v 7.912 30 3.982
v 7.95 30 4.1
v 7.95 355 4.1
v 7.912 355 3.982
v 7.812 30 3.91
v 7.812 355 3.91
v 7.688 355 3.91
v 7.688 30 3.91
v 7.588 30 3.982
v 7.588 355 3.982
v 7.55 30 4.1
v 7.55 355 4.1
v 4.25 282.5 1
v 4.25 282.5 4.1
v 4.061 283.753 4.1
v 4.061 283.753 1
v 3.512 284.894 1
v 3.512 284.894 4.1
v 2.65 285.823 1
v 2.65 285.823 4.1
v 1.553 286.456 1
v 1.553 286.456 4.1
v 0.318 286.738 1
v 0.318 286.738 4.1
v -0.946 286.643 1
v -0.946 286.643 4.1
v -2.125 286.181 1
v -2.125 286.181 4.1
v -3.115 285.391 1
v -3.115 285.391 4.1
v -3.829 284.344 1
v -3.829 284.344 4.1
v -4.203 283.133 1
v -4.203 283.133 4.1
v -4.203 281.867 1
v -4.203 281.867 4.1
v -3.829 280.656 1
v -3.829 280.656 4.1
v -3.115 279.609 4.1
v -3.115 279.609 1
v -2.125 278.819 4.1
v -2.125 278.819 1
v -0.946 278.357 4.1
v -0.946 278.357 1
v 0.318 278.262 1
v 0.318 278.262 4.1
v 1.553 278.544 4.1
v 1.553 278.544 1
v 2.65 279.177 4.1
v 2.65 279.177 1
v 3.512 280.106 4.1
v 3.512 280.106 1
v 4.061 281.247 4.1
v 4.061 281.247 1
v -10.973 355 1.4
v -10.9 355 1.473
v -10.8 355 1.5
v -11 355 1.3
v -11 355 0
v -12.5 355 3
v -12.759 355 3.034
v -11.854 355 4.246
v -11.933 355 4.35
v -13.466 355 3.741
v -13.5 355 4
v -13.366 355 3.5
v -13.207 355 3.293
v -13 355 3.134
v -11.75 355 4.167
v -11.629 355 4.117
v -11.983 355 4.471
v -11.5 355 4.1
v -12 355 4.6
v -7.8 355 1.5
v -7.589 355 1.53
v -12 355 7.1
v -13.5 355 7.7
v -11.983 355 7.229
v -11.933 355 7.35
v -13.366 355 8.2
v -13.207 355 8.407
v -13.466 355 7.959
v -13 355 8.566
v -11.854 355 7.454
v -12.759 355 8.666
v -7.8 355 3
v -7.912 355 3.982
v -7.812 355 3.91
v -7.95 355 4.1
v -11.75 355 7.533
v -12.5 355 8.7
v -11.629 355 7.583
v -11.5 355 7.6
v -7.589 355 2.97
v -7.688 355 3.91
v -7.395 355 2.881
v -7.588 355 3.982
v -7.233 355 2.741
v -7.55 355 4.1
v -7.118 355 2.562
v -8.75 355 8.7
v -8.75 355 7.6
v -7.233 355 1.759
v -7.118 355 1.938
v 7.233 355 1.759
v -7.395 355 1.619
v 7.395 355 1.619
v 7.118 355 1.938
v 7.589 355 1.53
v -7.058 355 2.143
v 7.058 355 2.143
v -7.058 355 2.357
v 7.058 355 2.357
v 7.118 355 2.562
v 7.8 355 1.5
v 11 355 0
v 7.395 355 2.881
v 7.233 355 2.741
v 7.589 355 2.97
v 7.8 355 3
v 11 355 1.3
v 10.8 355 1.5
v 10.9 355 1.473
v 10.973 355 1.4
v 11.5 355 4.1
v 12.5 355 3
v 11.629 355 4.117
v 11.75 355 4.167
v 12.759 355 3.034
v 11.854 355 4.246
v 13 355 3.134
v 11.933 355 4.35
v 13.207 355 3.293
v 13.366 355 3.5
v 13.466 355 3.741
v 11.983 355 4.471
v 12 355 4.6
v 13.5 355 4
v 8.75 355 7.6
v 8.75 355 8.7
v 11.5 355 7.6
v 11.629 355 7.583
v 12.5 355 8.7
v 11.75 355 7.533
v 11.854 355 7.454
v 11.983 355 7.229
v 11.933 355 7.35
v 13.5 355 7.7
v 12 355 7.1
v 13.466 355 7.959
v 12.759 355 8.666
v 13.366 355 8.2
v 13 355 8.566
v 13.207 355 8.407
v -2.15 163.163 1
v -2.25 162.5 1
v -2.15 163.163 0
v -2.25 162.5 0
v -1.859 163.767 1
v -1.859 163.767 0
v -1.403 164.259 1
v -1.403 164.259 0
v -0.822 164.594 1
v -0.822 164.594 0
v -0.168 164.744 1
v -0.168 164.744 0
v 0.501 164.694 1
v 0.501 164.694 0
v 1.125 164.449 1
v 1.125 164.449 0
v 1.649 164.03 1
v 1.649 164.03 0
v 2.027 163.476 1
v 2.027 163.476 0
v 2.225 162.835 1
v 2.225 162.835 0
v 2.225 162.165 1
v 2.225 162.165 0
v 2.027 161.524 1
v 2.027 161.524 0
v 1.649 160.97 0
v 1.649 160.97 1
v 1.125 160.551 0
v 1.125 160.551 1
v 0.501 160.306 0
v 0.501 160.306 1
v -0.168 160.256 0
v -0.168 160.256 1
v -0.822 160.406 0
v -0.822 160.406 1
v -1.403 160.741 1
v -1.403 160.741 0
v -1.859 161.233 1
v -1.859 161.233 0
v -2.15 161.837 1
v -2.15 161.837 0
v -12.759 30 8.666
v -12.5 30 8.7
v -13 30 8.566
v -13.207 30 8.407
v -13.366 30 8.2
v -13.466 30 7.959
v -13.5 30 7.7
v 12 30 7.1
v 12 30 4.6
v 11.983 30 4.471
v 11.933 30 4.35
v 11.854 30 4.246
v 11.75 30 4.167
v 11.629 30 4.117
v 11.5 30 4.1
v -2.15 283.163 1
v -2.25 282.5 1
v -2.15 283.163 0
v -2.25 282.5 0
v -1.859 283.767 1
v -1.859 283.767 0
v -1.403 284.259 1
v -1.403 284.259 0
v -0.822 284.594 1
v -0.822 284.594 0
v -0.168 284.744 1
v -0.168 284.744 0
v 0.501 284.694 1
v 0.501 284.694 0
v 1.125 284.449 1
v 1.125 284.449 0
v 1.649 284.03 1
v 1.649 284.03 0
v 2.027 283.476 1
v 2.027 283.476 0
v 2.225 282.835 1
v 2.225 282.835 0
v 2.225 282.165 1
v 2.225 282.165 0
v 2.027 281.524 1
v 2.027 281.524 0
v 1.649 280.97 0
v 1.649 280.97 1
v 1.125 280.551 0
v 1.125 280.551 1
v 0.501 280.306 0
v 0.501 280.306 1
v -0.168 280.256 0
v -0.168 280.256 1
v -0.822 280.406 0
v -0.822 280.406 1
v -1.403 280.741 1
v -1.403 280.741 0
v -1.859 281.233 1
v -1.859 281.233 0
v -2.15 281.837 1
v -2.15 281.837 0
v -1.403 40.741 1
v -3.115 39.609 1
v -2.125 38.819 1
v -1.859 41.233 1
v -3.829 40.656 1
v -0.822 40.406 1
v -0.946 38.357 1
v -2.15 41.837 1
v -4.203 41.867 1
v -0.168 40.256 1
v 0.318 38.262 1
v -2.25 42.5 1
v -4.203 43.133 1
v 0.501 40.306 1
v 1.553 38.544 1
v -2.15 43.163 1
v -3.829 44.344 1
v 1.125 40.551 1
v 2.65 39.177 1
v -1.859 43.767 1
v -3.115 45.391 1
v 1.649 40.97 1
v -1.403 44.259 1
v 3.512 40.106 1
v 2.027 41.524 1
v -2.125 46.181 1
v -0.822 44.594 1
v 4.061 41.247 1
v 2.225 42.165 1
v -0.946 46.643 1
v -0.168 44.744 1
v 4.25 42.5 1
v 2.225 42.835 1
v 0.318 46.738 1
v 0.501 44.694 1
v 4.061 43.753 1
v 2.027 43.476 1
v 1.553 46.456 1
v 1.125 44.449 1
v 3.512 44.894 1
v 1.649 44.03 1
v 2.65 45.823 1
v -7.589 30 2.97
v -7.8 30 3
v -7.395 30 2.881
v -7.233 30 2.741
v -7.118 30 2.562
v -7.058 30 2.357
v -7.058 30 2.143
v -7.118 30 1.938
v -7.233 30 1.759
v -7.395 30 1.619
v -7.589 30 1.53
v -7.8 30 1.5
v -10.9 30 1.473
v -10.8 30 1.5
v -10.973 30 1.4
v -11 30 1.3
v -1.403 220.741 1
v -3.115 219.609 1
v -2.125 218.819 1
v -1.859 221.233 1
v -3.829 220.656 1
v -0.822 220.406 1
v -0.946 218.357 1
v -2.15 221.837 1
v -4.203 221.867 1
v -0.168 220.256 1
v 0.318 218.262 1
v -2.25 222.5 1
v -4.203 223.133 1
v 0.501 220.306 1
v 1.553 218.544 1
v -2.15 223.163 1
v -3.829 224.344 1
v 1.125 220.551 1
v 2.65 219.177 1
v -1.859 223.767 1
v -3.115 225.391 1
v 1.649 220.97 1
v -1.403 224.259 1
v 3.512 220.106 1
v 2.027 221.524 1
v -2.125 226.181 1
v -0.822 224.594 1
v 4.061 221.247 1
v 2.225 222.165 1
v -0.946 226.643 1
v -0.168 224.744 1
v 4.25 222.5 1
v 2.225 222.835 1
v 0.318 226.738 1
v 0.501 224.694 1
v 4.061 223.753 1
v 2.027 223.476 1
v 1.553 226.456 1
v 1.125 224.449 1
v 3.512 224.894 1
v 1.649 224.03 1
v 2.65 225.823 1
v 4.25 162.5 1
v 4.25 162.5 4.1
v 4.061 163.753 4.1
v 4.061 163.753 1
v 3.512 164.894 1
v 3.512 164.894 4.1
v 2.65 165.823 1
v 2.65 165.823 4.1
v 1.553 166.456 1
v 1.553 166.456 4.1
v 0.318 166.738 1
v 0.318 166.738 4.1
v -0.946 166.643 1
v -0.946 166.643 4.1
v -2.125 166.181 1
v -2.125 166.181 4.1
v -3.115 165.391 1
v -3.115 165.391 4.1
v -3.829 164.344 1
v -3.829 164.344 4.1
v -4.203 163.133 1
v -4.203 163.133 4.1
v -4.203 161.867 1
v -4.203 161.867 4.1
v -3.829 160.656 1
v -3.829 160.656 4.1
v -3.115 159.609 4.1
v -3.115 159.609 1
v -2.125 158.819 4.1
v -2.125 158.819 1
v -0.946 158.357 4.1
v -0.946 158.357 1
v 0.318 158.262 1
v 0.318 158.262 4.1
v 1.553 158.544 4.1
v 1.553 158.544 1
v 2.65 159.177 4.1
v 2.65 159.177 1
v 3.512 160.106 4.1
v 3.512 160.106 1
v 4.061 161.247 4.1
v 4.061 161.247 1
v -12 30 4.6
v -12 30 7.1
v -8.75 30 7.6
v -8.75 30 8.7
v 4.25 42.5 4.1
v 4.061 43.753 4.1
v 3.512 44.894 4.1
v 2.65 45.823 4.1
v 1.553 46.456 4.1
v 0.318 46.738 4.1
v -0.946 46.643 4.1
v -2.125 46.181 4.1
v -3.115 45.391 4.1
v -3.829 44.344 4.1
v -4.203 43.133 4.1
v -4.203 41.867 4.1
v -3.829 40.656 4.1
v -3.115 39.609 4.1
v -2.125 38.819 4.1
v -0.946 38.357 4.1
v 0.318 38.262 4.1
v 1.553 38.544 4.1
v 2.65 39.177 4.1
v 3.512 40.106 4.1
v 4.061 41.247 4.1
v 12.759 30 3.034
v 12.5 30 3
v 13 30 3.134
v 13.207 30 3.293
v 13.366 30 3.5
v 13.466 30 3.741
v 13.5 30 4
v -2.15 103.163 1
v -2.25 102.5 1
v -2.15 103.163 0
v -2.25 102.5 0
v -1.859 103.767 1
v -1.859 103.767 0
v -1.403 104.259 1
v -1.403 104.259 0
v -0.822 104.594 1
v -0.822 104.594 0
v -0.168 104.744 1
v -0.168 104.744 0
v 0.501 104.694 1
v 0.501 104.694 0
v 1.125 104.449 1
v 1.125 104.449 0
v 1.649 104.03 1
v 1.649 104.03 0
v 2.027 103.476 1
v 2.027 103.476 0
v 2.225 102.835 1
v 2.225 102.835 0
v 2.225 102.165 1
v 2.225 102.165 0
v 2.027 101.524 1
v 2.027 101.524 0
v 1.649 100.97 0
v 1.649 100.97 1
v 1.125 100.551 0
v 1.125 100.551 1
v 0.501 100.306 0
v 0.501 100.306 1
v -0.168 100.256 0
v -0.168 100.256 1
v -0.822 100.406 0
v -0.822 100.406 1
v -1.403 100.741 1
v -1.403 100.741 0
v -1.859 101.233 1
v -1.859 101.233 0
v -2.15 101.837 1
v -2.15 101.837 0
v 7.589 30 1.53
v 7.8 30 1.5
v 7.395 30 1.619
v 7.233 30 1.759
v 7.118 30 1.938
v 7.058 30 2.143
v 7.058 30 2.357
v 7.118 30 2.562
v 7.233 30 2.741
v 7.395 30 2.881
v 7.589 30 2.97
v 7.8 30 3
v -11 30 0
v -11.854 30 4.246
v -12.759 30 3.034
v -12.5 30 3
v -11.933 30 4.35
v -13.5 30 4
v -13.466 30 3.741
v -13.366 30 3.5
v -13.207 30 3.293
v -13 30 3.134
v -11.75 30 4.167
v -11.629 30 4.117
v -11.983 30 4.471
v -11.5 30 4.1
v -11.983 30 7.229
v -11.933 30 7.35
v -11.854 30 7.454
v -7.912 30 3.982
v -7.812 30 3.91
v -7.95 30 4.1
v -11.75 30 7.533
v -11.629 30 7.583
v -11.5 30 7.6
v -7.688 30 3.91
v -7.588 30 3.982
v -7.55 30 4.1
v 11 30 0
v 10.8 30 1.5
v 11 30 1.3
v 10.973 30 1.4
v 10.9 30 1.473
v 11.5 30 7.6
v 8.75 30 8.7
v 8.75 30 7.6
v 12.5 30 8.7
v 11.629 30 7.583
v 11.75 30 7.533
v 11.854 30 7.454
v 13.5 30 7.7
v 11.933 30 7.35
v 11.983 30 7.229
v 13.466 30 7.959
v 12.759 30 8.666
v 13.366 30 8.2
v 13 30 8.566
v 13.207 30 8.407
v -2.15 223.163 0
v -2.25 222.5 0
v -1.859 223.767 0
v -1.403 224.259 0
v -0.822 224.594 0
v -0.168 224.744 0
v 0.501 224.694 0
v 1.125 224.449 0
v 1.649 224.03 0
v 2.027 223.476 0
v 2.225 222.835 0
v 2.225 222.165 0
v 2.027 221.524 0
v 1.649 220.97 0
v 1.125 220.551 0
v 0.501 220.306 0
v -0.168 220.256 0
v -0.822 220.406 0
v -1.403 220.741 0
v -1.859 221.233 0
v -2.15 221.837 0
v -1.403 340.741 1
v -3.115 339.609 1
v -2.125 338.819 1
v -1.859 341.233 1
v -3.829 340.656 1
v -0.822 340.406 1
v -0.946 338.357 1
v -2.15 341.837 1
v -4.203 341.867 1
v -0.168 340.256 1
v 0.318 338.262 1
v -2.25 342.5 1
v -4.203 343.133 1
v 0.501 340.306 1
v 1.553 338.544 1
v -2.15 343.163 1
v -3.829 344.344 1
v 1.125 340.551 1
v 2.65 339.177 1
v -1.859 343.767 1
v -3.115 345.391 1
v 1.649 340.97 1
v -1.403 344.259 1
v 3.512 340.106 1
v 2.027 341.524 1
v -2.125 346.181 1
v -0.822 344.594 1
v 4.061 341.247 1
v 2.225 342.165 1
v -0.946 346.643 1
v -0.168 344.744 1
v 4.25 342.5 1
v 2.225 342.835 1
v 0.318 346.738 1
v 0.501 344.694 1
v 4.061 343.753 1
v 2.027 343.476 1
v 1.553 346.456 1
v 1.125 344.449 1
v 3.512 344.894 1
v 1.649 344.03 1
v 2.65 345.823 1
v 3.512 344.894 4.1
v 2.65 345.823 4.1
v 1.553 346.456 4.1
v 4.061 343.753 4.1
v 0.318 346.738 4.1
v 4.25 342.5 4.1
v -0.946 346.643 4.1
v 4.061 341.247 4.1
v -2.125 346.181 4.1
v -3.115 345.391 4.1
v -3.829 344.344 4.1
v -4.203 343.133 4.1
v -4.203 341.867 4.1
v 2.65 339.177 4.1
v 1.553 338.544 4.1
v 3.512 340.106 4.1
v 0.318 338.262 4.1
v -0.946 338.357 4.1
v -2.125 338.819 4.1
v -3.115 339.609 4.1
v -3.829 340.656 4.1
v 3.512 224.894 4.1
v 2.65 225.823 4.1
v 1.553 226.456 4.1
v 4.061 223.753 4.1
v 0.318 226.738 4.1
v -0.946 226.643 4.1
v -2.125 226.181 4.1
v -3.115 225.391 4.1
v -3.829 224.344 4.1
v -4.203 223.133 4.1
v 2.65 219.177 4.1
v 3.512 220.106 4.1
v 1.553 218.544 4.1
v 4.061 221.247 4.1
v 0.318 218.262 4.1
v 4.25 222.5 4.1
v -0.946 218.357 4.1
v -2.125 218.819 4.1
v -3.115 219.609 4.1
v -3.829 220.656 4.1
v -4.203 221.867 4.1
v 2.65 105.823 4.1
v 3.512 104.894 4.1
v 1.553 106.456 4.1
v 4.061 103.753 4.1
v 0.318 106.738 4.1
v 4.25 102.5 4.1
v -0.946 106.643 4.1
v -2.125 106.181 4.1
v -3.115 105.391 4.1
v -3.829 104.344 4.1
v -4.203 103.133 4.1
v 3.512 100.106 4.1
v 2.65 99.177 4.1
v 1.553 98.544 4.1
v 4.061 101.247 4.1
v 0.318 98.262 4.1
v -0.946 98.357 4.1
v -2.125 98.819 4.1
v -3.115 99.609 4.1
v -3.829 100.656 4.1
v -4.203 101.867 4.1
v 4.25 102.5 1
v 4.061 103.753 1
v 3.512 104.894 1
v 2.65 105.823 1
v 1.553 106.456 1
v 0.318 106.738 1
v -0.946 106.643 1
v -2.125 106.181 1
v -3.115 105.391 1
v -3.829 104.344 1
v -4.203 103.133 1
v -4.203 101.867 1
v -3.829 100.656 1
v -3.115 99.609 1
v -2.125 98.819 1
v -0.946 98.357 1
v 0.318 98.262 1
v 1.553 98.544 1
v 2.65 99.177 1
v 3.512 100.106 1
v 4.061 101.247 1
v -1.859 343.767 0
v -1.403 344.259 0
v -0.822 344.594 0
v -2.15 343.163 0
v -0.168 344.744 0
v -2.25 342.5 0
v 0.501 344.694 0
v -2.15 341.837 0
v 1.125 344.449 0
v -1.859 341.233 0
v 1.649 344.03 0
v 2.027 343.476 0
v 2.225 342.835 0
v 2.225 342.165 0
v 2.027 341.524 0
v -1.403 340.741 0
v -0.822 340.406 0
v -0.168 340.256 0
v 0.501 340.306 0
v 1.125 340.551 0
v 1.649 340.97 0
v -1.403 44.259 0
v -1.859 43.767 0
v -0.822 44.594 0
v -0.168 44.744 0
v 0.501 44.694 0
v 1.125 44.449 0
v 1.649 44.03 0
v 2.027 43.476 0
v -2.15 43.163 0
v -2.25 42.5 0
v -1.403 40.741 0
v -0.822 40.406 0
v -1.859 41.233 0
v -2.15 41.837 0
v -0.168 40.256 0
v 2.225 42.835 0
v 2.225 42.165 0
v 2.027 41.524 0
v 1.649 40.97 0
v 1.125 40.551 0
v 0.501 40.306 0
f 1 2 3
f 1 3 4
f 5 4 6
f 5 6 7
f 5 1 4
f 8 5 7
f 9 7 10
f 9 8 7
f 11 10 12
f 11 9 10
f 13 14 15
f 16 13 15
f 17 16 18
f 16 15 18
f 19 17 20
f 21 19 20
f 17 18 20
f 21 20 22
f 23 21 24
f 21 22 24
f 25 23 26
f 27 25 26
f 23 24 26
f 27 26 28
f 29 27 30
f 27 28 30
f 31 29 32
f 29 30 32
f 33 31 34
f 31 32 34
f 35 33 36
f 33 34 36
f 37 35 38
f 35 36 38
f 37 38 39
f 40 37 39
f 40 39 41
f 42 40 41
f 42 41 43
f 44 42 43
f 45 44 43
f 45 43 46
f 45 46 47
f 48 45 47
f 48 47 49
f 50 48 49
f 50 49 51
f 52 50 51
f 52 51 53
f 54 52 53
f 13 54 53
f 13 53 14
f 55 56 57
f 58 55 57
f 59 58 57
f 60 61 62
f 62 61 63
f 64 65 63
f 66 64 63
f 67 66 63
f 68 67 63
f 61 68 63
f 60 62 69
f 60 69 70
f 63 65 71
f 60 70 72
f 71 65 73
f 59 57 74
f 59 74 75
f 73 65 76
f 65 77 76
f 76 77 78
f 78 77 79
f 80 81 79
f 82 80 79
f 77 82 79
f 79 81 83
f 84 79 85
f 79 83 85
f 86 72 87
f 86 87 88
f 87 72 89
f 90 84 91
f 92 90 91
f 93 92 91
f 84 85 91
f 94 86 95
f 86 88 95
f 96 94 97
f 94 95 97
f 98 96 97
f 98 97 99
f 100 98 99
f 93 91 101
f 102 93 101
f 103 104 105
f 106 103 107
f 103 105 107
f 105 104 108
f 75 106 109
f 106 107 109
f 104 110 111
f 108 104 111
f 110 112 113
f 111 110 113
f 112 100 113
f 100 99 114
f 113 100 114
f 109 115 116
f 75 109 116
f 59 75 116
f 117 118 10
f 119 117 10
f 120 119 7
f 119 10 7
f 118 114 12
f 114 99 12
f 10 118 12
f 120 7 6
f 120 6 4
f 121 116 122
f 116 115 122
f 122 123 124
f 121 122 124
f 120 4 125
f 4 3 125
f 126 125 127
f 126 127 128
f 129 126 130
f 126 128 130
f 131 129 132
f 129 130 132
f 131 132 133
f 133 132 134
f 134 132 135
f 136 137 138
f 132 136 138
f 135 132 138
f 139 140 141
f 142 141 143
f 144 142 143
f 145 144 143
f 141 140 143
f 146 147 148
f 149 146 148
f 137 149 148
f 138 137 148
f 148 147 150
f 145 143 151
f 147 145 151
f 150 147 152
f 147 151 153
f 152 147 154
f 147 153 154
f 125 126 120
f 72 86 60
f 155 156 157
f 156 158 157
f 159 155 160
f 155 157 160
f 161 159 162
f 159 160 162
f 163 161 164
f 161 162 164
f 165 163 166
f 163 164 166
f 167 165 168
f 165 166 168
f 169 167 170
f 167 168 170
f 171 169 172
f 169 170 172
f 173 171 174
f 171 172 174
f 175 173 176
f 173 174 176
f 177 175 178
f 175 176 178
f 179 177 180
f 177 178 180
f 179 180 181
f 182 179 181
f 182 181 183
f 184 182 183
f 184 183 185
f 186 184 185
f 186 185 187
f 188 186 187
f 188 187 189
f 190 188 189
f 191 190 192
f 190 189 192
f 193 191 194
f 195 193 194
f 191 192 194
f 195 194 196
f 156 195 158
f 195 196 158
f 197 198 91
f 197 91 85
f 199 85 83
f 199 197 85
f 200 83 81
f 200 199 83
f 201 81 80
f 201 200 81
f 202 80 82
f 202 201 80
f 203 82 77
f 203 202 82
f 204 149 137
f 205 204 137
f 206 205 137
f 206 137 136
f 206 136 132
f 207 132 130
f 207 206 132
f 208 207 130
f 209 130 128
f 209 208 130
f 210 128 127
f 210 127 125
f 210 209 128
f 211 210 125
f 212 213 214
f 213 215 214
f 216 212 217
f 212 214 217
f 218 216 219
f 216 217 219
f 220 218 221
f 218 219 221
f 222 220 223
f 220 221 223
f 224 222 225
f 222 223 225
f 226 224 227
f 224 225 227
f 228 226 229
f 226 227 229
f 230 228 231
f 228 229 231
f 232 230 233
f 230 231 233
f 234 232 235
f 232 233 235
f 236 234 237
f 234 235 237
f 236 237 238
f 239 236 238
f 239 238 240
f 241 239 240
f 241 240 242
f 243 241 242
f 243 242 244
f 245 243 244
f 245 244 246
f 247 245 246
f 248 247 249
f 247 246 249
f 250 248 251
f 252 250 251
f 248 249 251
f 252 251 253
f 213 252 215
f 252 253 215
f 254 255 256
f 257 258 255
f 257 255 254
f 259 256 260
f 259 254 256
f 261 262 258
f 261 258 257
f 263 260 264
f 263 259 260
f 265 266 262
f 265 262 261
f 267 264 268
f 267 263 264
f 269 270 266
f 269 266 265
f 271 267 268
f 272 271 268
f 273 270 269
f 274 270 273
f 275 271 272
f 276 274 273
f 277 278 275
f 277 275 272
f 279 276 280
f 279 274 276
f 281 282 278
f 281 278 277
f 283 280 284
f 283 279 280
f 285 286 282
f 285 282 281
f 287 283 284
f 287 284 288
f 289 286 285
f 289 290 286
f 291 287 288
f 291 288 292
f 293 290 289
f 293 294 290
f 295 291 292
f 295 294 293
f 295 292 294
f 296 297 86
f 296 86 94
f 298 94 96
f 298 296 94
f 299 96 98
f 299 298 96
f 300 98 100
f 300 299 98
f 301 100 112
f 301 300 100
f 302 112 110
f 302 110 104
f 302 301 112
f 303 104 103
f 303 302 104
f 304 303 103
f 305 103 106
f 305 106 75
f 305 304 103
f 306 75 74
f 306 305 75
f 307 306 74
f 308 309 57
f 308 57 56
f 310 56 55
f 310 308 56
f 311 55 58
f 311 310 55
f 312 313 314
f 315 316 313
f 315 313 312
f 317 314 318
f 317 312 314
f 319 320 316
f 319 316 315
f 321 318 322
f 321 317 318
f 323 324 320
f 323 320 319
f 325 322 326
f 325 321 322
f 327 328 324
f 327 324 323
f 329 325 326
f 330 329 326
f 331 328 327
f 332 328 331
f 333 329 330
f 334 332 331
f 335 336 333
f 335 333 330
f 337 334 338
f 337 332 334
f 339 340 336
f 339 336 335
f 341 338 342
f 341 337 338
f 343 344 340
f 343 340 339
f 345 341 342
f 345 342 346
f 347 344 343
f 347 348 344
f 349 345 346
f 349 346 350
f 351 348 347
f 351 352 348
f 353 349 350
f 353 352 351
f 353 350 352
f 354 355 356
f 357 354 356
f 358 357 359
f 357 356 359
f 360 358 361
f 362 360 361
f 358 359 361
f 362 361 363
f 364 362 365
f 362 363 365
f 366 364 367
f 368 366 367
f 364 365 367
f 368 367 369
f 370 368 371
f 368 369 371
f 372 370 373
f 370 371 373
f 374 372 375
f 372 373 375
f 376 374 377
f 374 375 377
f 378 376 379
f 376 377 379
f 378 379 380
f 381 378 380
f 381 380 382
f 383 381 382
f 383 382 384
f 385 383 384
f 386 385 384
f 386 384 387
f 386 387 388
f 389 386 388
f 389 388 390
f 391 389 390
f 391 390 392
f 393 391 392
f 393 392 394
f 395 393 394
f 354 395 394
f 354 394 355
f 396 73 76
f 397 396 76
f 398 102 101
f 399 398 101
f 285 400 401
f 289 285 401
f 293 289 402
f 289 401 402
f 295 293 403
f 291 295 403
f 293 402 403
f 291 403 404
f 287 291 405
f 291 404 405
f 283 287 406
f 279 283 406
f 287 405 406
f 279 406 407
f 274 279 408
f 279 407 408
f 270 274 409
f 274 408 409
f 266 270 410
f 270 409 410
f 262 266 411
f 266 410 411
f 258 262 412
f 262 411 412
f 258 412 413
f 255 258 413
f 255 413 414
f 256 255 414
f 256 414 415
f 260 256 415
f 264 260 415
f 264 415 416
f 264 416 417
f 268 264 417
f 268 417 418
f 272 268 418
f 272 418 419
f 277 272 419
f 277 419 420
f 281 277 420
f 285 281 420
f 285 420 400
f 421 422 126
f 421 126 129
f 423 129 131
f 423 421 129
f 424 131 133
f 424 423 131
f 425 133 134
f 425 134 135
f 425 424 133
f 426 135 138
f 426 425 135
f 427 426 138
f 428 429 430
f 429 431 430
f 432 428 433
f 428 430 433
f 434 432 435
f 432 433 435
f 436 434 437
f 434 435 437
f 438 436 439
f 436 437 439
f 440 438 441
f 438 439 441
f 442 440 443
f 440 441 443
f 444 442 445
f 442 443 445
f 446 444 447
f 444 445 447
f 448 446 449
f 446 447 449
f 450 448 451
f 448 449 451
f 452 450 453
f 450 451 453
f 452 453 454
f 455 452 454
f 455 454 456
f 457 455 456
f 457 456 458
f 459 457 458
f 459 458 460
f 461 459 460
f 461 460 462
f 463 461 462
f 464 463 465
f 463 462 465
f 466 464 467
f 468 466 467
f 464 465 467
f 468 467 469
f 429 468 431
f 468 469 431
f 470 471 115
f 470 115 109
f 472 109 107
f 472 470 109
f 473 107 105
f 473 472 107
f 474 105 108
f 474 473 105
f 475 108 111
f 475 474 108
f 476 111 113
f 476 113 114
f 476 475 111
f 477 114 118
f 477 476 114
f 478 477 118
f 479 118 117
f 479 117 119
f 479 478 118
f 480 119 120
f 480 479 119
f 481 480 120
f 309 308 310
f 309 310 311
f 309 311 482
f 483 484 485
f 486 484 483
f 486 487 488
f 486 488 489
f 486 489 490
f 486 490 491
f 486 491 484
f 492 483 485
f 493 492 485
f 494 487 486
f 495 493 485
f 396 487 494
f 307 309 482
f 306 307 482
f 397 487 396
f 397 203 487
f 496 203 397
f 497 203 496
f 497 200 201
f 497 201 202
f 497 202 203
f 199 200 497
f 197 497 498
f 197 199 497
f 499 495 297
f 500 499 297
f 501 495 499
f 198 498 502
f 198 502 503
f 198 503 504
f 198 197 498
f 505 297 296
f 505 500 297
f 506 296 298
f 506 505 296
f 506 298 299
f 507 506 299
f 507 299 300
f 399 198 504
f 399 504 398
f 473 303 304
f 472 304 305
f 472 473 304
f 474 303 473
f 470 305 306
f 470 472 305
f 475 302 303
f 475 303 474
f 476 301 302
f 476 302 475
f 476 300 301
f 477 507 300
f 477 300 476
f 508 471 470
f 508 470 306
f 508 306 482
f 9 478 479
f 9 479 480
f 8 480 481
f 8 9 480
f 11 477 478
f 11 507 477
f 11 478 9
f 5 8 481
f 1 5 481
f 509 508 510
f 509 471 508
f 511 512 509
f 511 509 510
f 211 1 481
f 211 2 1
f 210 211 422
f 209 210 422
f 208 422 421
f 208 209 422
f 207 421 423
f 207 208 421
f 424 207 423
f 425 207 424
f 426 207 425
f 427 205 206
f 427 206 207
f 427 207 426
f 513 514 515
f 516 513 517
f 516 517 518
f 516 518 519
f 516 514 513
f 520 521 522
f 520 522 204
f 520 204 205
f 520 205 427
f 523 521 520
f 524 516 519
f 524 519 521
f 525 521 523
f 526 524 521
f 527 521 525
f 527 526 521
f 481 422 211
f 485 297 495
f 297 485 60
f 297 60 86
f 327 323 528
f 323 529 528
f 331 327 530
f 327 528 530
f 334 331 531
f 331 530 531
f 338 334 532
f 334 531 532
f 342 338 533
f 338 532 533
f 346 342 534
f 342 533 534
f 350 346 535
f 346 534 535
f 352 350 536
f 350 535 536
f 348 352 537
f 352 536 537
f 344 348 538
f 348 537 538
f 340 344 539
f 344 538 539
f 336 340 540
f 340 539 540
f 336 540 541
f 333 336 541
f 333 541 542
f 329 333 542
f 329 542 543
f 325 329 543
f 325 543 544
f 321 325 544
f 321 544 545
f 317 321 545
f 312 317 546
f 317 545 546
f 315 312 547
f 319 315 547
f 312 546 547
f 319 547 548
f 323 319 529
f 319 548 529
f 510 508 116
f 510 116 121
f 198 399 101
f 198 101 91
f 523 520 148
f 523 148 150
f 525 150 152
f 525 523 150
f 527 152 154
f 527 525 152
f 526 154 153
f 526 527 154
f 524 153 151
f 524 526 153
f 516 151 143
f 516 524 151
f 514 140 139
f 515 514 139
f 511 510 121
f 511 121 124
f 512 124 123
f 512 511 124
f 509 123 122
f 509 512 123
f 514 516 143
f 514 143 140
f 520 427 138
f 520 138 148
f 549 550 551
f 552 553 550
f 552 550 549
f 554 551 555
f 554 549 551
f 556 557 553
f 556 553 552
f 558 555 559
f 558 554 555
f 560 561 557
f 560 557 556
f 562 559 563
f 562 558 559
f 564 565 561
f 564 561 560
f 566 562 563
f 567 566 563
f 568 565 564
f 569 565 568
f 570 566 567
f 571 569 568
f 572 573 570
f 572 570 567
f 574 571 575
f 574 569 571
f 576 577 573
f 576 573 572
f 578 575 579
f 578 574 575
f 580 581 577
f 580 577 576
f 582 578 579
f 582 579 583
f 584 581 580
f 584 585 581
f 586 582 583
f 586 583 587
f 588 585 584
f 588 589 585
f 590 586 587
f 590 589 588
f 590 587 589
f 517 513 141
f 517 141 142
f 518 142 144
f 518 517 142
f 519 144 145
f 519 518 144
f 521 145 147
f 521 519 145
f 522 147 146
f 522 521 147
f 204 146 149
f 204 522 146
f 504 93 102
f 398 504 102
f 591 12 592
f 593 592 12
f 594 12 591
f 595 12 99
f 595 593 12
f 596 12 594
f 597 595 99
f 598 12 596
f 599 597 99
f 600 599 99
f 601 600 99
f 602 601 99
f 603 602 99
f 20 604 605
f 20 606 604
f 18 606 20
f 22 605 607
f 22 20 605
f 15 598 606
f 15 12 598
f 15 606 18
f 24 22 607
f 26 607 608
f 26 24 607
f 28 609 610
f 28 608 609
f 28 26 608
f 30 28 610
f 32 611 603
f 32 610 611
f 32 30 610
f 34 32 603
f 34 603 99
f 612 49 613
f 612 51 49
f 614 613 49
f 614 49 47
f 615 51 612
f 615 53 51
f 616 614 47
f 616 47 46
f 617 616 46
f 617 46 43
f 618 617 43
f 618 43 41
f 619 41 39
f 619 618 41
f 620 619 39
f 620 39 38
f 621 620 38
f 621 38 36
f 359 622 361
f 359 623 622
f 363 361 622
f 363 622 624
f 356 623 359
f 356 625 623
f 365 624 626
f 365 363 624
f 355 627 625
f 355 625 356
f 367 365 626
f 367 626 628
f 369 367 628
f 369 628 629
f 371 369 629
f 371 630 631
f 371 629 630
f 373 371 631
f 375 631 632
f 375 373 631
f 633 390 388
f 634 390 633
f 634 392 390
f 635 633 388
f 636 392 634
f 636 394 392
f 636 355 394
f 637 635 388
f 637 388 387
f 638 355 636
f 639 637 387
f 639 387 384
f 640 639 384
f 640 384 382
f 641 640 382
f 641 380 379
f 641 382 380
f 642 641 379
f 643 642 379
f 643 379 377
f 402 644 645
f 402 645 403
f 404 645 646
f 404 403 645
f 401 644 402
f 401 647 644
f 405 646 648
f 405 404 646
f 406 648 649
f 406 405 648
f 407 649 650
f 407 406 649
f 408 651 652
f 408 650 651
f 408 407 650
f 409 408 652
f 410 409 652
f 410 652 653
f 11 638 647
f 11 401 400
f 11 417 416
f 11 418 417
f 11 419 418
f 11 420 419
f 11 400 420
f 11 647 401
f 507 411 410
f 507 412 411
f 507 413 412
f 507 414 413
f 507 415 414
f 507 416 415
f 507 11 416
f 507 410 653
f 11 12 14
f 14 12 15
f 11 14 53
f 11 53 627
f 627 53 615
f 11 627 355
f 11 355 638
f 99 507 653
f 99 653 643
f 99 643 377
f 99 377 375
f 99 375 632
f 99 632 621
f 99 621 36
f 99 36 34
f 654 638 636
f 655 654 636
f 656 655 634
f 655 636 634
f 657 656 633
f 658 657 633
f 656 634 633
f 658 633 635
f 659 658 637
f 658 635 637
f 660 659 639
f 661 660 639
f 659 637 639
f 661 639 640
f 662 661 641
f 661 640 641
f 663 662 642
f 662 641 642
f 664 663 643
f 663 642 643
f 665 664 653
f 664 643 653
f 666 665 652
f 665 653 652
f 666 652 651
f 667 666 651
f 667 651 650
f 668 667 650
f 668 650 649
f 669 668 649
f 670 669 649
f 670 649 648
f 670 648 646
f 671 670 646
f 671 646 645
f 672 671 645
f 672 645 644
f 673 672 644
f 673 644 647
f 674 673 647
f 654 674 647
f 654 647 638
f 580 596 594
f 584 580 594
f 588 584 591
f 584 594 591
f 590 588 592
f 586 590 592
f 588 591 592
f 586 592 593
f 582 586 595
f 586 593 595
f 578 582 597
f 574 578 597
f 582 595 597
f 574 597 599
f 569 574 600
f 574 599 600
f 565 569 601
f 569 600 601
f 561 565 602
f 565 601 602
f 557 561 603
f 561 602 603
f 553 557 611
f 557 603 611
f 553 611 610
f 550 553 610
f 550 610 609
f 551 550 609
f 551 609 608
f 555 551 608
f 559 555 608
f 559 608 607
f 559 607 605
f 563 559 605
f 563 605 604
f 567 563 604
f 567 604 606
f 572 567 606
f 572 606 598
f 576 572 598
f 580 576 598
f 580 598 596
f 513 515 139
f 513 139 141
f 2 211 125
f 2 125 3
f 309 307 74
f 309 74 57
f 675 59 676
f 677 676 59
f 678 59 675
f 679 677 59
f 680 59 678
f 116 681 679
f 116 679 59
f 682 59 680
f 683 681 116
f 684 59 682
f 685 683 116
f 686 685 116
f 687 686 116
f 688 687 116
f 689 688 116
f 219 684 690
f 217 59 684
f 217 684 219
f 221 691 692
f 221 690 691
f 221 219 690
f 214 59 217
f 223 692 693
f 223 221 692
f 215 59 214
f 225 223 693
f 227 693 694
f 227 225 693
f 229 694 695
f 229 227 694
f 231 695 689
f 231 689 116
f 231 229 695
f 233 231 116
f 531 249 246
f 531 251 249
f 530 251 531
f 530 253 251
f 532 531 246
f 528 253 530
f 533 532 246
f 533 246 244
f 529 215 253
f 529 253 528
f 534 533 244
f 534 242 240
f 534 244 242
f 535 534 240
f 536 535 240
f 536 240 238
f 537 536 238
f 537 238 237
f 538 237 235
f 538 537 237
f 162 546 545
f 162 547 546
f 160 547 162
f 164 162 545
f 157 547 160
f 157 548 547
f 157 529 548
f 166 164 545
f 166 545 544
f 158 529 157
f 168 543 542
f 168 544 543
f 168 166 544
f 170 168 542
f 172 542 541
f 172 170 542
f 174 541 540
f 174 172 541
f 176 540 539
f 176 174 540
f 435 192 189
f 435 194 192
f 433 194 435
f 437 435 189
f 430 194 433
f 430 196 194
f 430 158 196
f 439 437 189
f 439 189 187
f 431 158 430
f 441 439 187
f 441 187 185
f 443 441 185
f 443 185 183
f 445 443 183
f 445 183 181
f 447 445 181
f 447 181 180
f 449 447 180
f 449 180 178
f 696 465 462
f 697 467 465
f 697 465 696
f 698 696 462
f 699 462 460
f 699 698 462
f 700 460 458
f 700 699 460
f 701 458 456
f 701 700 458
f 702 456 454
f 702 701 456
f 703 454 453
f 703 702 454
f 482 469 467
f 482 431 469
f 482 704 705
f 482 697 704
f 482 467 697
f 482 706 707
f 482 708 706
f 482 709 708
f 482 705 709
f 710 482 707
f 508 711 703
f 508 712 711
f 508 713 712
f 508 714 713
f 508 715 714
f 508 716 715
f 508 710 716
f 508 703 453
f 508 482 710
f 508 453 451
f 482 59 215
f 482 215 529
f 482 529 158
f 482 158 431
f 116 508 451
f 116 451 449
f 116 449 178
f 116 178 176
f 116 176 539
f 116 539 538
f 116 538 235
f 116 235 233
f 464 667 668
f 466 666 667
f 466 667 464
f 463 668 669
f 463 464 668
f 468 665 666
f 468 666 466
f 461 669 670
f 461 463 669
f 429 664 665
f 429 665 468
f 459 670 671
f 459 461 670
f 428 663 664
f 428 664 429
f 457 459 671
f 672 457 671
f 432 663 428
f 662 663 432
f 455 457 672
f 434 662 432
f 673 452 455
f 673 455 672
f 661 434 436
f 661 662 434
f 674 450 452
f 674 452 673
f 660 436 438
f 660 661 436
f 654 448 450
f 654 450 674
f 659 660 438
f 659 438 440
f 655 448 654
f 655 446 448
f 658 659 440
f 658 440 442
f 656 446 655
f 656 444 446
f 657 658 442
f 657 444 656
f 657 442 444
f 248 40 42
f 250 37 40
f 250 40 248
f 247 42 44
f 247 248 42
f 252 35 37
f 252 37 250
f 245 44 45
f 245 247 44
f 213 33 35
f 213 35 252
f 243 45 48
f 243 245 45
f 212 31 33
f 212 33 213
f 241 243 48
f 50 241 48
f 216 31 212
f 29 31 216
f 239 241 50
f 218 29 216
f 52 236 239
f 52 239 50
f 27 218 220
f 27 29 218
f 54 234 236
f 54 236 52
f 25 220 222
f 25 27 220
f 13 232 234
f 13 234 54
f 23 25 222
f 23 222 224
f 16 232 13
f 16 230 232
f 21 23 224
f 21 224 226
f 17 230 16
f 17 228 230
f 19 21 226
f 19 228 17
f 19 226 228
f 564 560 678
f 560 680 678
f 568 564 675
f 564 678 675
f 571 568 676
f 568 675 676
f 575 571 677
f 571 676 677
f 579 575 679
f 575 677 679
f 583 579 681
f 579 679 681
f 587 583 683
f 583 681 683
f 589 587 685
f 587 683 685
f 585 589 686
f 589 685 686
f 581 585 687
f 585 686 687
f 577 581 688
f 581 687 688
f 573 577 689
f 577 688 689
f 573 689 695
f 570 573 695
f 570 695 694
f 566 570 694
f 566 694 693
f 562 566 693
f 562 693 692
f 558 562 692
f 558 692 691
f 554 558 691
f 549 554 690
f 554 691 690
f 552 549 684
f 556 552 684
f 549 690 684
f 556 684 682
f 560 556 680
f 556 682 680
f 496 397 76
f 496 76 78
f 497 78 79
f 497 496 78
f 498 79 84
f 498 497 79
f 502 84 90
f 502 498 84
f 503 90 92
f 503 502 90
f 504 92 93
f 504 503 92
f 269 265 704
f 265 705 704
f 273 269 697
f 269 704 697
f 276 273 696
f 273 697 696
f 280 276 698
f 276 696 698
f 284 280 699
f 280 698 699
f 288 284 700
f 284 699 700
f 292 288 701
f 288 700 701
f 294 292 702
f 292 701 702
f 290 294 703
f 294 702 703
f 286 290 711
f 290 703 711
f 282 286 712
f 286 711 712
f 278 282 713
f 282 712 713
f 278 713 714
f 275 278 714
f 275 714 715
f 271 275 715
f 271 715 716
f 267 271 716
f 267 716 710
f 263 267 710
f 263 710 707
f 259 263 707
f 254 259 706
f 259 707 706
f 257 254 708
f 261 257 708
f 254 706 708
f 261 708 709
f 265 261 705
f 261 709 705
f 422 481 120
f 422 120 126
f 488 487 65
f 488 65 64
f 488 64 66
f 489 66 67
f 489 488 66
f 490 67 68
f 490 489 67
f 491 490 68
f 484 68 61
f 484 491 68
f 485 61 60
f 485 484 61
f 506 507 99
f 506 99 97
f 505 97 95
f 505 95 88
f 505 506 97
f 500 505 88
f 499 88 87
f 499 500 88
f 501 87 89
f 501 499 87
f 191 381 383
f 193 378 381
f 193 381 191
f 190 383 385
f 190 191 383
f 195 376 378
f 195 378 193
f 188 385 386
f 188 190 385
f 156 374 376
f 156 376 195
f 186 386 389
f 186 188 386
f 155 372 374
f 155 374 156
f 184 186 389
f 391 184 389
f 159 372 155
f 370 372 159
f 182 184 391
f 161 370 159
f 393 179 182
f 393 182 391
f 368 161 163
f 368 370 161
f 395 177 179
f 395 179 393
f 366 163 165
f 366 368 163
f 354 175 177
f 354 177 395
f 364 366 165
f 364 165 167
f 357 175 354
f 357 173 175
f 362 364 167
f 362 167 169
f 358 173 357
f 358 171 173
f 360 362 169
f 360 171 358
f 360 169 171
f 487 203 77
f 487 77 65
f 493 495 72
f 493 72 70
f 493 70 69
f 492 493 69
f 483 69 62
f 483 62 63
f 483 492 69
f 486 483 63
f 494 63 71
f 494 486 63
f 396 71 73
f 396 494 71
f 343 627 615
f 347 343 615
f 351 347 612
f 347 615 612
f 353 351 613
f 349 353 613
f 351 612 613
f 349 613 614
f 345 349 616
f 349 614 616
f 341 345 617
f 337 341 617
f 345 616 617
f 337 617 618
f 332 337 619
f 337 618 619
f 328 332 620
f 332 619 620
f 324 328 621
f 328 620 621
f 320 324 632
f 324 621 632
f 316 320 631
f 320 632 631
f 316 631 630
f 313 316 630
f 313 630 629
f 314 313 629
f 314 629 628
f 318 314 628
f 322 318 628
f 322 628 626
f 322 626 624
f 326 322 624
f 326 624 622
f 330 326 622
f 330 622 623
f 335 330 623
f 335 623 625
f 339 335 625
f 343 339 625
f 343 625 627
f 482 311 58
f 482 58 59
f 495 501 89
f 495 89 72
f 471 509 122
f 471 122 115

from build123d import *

# Parameters (mm, degrees)
BOSS_EXTRUDE1_DEPTH                              = 325
CBORE_FOR_M4_HEX_HEAD_MACHINE_SCREW1_D           = 4.5
CBORE_FOR_M4_HEX_HEAD_MACHINE_SCREW1_CBORE_D     = 8.5
CBORE_FOR_M4_HEX_HEAD_MACHINE_SCREW1_CBORE_DEPTH = 3.1
LPATTERN1_COUNT                                  = 6
LPATTERN1_PITCH                                  = 60


with BuildPart() as part:
    # Sketch1 → Boss-Extrude1 (new body)
    with BuildSketch(Plane.XZ.offset(-30)):
        with BuildLine():
            Line((-7.8, 1.5), (-10.8, 1.5))
            ThreePointArc((-10.8, 1.5), (-10.941421356, 1.441421356), (-11, 1.3))
            Line((-11, 1.3), (-11, 0))
            Line((-11, 0), (11, 0))
            Line((11, 0), (11, 1.3))
            ThreePointArc((11, 1.3), (10.941421356, 1.441421356), (10.8, 1.5))
            Line((10.8, 1.5), (7.8, 1.5))
            ThreePointArc((7.8, 1.5), (7.05, 2.249999999), (7.8, 2.999999999))
            Line((7.8, 2.999999999), (12.5, 2.999999999))
            ThreePointArc((12.5, 2.999999999), (13.207106782, 3.292893218), (13.5, 4))
            Line((13.5, 4), (13.5, 7.7))
            ThreePointArc((13.5, 7.7), (13.207106782, 8.407106781), (12.5, 8.7))
            Line((12.5, 8.7), (8.750000002, 8.7))
            Line((8.750000002, 8.7), (8.750000002, 7.599999996))
            Line((8.750000002, 7.599999996), (11.500000003, 7.599999996))
            ThreePointArc((11.500000003, 7.599999996), (11.853553391, 7.453553388), (11.999999999, 7.1))
            Line((11.999999999, 7.1), (11.999999999, 4.6))
            ThreePointArc((11.999999999, 4.6), (11.853553391, 4.246446612), (11.500000003, 4.100000003))
            Line((11.500000003, 4.100000003), (7.950000003, 4.100000003))
            ThreePointArc((7.950000003, 4.100000003), (7.750000003, 3.900000003), (7.550000003, 4.100000003))
            Line((7.550000003, 4.100000003), (-7.549999997, 4.100000003))
            ThreePointArc((-7.549999997, 4.100000003), (-7.749999997, 3.900000003), (-7.949999997, 4.100000003))
            Line((-7.949999997, 4.100000003), (-11.499999997, 4.100000003))
            ThreePointArc((-11.499999997, 4.100000003), (-11.853553386, 4.246446612), (-11.999999994, 4.6))
            Line((-11.999999994, 4.6), (-11.999999994, 7.1))
            ThreePointArc((-11.999999994, 7.1), (-11.853553386, 7.453553388), (-11.499999998, 7.599999996))
            Line((-11.499999998, 7.599999996), (-8.749999996, 7.599999996))
            Line((-8.749999996, 7.599999996), (-8.749999996, 8.7))
            Line((-8.749999996, 8.7), (-12.5, 8.7))
            ThreePointArc((-12.5, 8.7), (-13.207106782, 8.407106781), (-13.5, 7.7))
            Line((-13.5, 7.7), (-13.5, 4))
            ThreePointArc((-13.5, 4), (-13.207106782, 3.292893218), (-12.5, 2.999999999))
            Line((-12.5, 2.999999999), (-7.8, 2.999999999))
            ThreePointArc((-7.8, 2.999999999), (-7.05, 2.249999999), (-7.8, 1.5))
        make_face()
    extrude(amount=-BOSS_EXTRUDE1_DEPTH)

    # CBORE for M4 Hex Head Machine Screw1 (through all)
    with Locations(Plane.XY.offset(4.100000003)):
        with Locations((0, 42.5)):
            cbore_for_m4_hex_head_machine_screw1 = CounterBoreHole(CBORE_FOR_M4_HEX_HEAD_MACHINE_SCREW1_D / 2, CBORE_FOR_M4_HEX_HEAD_MACHINE_SCREW1_CBORE_D / 2, CBORE_FOR_M4_HEX_HEAD_MACHINE_SCREW1_CBORE_DEPTH)

    # LPattern1: CBORE for M4 Hex Head Machine Screw1 ×6
    with Locations(*[(0, i * LPATTERN1_PITCH, 0) for i in range(1, LPATTERN1_COUNT)]):
        add(cbore_for_m4_hex_head_machine_screw1, mode=Mode.SUBTRACT)


solid = part.part
